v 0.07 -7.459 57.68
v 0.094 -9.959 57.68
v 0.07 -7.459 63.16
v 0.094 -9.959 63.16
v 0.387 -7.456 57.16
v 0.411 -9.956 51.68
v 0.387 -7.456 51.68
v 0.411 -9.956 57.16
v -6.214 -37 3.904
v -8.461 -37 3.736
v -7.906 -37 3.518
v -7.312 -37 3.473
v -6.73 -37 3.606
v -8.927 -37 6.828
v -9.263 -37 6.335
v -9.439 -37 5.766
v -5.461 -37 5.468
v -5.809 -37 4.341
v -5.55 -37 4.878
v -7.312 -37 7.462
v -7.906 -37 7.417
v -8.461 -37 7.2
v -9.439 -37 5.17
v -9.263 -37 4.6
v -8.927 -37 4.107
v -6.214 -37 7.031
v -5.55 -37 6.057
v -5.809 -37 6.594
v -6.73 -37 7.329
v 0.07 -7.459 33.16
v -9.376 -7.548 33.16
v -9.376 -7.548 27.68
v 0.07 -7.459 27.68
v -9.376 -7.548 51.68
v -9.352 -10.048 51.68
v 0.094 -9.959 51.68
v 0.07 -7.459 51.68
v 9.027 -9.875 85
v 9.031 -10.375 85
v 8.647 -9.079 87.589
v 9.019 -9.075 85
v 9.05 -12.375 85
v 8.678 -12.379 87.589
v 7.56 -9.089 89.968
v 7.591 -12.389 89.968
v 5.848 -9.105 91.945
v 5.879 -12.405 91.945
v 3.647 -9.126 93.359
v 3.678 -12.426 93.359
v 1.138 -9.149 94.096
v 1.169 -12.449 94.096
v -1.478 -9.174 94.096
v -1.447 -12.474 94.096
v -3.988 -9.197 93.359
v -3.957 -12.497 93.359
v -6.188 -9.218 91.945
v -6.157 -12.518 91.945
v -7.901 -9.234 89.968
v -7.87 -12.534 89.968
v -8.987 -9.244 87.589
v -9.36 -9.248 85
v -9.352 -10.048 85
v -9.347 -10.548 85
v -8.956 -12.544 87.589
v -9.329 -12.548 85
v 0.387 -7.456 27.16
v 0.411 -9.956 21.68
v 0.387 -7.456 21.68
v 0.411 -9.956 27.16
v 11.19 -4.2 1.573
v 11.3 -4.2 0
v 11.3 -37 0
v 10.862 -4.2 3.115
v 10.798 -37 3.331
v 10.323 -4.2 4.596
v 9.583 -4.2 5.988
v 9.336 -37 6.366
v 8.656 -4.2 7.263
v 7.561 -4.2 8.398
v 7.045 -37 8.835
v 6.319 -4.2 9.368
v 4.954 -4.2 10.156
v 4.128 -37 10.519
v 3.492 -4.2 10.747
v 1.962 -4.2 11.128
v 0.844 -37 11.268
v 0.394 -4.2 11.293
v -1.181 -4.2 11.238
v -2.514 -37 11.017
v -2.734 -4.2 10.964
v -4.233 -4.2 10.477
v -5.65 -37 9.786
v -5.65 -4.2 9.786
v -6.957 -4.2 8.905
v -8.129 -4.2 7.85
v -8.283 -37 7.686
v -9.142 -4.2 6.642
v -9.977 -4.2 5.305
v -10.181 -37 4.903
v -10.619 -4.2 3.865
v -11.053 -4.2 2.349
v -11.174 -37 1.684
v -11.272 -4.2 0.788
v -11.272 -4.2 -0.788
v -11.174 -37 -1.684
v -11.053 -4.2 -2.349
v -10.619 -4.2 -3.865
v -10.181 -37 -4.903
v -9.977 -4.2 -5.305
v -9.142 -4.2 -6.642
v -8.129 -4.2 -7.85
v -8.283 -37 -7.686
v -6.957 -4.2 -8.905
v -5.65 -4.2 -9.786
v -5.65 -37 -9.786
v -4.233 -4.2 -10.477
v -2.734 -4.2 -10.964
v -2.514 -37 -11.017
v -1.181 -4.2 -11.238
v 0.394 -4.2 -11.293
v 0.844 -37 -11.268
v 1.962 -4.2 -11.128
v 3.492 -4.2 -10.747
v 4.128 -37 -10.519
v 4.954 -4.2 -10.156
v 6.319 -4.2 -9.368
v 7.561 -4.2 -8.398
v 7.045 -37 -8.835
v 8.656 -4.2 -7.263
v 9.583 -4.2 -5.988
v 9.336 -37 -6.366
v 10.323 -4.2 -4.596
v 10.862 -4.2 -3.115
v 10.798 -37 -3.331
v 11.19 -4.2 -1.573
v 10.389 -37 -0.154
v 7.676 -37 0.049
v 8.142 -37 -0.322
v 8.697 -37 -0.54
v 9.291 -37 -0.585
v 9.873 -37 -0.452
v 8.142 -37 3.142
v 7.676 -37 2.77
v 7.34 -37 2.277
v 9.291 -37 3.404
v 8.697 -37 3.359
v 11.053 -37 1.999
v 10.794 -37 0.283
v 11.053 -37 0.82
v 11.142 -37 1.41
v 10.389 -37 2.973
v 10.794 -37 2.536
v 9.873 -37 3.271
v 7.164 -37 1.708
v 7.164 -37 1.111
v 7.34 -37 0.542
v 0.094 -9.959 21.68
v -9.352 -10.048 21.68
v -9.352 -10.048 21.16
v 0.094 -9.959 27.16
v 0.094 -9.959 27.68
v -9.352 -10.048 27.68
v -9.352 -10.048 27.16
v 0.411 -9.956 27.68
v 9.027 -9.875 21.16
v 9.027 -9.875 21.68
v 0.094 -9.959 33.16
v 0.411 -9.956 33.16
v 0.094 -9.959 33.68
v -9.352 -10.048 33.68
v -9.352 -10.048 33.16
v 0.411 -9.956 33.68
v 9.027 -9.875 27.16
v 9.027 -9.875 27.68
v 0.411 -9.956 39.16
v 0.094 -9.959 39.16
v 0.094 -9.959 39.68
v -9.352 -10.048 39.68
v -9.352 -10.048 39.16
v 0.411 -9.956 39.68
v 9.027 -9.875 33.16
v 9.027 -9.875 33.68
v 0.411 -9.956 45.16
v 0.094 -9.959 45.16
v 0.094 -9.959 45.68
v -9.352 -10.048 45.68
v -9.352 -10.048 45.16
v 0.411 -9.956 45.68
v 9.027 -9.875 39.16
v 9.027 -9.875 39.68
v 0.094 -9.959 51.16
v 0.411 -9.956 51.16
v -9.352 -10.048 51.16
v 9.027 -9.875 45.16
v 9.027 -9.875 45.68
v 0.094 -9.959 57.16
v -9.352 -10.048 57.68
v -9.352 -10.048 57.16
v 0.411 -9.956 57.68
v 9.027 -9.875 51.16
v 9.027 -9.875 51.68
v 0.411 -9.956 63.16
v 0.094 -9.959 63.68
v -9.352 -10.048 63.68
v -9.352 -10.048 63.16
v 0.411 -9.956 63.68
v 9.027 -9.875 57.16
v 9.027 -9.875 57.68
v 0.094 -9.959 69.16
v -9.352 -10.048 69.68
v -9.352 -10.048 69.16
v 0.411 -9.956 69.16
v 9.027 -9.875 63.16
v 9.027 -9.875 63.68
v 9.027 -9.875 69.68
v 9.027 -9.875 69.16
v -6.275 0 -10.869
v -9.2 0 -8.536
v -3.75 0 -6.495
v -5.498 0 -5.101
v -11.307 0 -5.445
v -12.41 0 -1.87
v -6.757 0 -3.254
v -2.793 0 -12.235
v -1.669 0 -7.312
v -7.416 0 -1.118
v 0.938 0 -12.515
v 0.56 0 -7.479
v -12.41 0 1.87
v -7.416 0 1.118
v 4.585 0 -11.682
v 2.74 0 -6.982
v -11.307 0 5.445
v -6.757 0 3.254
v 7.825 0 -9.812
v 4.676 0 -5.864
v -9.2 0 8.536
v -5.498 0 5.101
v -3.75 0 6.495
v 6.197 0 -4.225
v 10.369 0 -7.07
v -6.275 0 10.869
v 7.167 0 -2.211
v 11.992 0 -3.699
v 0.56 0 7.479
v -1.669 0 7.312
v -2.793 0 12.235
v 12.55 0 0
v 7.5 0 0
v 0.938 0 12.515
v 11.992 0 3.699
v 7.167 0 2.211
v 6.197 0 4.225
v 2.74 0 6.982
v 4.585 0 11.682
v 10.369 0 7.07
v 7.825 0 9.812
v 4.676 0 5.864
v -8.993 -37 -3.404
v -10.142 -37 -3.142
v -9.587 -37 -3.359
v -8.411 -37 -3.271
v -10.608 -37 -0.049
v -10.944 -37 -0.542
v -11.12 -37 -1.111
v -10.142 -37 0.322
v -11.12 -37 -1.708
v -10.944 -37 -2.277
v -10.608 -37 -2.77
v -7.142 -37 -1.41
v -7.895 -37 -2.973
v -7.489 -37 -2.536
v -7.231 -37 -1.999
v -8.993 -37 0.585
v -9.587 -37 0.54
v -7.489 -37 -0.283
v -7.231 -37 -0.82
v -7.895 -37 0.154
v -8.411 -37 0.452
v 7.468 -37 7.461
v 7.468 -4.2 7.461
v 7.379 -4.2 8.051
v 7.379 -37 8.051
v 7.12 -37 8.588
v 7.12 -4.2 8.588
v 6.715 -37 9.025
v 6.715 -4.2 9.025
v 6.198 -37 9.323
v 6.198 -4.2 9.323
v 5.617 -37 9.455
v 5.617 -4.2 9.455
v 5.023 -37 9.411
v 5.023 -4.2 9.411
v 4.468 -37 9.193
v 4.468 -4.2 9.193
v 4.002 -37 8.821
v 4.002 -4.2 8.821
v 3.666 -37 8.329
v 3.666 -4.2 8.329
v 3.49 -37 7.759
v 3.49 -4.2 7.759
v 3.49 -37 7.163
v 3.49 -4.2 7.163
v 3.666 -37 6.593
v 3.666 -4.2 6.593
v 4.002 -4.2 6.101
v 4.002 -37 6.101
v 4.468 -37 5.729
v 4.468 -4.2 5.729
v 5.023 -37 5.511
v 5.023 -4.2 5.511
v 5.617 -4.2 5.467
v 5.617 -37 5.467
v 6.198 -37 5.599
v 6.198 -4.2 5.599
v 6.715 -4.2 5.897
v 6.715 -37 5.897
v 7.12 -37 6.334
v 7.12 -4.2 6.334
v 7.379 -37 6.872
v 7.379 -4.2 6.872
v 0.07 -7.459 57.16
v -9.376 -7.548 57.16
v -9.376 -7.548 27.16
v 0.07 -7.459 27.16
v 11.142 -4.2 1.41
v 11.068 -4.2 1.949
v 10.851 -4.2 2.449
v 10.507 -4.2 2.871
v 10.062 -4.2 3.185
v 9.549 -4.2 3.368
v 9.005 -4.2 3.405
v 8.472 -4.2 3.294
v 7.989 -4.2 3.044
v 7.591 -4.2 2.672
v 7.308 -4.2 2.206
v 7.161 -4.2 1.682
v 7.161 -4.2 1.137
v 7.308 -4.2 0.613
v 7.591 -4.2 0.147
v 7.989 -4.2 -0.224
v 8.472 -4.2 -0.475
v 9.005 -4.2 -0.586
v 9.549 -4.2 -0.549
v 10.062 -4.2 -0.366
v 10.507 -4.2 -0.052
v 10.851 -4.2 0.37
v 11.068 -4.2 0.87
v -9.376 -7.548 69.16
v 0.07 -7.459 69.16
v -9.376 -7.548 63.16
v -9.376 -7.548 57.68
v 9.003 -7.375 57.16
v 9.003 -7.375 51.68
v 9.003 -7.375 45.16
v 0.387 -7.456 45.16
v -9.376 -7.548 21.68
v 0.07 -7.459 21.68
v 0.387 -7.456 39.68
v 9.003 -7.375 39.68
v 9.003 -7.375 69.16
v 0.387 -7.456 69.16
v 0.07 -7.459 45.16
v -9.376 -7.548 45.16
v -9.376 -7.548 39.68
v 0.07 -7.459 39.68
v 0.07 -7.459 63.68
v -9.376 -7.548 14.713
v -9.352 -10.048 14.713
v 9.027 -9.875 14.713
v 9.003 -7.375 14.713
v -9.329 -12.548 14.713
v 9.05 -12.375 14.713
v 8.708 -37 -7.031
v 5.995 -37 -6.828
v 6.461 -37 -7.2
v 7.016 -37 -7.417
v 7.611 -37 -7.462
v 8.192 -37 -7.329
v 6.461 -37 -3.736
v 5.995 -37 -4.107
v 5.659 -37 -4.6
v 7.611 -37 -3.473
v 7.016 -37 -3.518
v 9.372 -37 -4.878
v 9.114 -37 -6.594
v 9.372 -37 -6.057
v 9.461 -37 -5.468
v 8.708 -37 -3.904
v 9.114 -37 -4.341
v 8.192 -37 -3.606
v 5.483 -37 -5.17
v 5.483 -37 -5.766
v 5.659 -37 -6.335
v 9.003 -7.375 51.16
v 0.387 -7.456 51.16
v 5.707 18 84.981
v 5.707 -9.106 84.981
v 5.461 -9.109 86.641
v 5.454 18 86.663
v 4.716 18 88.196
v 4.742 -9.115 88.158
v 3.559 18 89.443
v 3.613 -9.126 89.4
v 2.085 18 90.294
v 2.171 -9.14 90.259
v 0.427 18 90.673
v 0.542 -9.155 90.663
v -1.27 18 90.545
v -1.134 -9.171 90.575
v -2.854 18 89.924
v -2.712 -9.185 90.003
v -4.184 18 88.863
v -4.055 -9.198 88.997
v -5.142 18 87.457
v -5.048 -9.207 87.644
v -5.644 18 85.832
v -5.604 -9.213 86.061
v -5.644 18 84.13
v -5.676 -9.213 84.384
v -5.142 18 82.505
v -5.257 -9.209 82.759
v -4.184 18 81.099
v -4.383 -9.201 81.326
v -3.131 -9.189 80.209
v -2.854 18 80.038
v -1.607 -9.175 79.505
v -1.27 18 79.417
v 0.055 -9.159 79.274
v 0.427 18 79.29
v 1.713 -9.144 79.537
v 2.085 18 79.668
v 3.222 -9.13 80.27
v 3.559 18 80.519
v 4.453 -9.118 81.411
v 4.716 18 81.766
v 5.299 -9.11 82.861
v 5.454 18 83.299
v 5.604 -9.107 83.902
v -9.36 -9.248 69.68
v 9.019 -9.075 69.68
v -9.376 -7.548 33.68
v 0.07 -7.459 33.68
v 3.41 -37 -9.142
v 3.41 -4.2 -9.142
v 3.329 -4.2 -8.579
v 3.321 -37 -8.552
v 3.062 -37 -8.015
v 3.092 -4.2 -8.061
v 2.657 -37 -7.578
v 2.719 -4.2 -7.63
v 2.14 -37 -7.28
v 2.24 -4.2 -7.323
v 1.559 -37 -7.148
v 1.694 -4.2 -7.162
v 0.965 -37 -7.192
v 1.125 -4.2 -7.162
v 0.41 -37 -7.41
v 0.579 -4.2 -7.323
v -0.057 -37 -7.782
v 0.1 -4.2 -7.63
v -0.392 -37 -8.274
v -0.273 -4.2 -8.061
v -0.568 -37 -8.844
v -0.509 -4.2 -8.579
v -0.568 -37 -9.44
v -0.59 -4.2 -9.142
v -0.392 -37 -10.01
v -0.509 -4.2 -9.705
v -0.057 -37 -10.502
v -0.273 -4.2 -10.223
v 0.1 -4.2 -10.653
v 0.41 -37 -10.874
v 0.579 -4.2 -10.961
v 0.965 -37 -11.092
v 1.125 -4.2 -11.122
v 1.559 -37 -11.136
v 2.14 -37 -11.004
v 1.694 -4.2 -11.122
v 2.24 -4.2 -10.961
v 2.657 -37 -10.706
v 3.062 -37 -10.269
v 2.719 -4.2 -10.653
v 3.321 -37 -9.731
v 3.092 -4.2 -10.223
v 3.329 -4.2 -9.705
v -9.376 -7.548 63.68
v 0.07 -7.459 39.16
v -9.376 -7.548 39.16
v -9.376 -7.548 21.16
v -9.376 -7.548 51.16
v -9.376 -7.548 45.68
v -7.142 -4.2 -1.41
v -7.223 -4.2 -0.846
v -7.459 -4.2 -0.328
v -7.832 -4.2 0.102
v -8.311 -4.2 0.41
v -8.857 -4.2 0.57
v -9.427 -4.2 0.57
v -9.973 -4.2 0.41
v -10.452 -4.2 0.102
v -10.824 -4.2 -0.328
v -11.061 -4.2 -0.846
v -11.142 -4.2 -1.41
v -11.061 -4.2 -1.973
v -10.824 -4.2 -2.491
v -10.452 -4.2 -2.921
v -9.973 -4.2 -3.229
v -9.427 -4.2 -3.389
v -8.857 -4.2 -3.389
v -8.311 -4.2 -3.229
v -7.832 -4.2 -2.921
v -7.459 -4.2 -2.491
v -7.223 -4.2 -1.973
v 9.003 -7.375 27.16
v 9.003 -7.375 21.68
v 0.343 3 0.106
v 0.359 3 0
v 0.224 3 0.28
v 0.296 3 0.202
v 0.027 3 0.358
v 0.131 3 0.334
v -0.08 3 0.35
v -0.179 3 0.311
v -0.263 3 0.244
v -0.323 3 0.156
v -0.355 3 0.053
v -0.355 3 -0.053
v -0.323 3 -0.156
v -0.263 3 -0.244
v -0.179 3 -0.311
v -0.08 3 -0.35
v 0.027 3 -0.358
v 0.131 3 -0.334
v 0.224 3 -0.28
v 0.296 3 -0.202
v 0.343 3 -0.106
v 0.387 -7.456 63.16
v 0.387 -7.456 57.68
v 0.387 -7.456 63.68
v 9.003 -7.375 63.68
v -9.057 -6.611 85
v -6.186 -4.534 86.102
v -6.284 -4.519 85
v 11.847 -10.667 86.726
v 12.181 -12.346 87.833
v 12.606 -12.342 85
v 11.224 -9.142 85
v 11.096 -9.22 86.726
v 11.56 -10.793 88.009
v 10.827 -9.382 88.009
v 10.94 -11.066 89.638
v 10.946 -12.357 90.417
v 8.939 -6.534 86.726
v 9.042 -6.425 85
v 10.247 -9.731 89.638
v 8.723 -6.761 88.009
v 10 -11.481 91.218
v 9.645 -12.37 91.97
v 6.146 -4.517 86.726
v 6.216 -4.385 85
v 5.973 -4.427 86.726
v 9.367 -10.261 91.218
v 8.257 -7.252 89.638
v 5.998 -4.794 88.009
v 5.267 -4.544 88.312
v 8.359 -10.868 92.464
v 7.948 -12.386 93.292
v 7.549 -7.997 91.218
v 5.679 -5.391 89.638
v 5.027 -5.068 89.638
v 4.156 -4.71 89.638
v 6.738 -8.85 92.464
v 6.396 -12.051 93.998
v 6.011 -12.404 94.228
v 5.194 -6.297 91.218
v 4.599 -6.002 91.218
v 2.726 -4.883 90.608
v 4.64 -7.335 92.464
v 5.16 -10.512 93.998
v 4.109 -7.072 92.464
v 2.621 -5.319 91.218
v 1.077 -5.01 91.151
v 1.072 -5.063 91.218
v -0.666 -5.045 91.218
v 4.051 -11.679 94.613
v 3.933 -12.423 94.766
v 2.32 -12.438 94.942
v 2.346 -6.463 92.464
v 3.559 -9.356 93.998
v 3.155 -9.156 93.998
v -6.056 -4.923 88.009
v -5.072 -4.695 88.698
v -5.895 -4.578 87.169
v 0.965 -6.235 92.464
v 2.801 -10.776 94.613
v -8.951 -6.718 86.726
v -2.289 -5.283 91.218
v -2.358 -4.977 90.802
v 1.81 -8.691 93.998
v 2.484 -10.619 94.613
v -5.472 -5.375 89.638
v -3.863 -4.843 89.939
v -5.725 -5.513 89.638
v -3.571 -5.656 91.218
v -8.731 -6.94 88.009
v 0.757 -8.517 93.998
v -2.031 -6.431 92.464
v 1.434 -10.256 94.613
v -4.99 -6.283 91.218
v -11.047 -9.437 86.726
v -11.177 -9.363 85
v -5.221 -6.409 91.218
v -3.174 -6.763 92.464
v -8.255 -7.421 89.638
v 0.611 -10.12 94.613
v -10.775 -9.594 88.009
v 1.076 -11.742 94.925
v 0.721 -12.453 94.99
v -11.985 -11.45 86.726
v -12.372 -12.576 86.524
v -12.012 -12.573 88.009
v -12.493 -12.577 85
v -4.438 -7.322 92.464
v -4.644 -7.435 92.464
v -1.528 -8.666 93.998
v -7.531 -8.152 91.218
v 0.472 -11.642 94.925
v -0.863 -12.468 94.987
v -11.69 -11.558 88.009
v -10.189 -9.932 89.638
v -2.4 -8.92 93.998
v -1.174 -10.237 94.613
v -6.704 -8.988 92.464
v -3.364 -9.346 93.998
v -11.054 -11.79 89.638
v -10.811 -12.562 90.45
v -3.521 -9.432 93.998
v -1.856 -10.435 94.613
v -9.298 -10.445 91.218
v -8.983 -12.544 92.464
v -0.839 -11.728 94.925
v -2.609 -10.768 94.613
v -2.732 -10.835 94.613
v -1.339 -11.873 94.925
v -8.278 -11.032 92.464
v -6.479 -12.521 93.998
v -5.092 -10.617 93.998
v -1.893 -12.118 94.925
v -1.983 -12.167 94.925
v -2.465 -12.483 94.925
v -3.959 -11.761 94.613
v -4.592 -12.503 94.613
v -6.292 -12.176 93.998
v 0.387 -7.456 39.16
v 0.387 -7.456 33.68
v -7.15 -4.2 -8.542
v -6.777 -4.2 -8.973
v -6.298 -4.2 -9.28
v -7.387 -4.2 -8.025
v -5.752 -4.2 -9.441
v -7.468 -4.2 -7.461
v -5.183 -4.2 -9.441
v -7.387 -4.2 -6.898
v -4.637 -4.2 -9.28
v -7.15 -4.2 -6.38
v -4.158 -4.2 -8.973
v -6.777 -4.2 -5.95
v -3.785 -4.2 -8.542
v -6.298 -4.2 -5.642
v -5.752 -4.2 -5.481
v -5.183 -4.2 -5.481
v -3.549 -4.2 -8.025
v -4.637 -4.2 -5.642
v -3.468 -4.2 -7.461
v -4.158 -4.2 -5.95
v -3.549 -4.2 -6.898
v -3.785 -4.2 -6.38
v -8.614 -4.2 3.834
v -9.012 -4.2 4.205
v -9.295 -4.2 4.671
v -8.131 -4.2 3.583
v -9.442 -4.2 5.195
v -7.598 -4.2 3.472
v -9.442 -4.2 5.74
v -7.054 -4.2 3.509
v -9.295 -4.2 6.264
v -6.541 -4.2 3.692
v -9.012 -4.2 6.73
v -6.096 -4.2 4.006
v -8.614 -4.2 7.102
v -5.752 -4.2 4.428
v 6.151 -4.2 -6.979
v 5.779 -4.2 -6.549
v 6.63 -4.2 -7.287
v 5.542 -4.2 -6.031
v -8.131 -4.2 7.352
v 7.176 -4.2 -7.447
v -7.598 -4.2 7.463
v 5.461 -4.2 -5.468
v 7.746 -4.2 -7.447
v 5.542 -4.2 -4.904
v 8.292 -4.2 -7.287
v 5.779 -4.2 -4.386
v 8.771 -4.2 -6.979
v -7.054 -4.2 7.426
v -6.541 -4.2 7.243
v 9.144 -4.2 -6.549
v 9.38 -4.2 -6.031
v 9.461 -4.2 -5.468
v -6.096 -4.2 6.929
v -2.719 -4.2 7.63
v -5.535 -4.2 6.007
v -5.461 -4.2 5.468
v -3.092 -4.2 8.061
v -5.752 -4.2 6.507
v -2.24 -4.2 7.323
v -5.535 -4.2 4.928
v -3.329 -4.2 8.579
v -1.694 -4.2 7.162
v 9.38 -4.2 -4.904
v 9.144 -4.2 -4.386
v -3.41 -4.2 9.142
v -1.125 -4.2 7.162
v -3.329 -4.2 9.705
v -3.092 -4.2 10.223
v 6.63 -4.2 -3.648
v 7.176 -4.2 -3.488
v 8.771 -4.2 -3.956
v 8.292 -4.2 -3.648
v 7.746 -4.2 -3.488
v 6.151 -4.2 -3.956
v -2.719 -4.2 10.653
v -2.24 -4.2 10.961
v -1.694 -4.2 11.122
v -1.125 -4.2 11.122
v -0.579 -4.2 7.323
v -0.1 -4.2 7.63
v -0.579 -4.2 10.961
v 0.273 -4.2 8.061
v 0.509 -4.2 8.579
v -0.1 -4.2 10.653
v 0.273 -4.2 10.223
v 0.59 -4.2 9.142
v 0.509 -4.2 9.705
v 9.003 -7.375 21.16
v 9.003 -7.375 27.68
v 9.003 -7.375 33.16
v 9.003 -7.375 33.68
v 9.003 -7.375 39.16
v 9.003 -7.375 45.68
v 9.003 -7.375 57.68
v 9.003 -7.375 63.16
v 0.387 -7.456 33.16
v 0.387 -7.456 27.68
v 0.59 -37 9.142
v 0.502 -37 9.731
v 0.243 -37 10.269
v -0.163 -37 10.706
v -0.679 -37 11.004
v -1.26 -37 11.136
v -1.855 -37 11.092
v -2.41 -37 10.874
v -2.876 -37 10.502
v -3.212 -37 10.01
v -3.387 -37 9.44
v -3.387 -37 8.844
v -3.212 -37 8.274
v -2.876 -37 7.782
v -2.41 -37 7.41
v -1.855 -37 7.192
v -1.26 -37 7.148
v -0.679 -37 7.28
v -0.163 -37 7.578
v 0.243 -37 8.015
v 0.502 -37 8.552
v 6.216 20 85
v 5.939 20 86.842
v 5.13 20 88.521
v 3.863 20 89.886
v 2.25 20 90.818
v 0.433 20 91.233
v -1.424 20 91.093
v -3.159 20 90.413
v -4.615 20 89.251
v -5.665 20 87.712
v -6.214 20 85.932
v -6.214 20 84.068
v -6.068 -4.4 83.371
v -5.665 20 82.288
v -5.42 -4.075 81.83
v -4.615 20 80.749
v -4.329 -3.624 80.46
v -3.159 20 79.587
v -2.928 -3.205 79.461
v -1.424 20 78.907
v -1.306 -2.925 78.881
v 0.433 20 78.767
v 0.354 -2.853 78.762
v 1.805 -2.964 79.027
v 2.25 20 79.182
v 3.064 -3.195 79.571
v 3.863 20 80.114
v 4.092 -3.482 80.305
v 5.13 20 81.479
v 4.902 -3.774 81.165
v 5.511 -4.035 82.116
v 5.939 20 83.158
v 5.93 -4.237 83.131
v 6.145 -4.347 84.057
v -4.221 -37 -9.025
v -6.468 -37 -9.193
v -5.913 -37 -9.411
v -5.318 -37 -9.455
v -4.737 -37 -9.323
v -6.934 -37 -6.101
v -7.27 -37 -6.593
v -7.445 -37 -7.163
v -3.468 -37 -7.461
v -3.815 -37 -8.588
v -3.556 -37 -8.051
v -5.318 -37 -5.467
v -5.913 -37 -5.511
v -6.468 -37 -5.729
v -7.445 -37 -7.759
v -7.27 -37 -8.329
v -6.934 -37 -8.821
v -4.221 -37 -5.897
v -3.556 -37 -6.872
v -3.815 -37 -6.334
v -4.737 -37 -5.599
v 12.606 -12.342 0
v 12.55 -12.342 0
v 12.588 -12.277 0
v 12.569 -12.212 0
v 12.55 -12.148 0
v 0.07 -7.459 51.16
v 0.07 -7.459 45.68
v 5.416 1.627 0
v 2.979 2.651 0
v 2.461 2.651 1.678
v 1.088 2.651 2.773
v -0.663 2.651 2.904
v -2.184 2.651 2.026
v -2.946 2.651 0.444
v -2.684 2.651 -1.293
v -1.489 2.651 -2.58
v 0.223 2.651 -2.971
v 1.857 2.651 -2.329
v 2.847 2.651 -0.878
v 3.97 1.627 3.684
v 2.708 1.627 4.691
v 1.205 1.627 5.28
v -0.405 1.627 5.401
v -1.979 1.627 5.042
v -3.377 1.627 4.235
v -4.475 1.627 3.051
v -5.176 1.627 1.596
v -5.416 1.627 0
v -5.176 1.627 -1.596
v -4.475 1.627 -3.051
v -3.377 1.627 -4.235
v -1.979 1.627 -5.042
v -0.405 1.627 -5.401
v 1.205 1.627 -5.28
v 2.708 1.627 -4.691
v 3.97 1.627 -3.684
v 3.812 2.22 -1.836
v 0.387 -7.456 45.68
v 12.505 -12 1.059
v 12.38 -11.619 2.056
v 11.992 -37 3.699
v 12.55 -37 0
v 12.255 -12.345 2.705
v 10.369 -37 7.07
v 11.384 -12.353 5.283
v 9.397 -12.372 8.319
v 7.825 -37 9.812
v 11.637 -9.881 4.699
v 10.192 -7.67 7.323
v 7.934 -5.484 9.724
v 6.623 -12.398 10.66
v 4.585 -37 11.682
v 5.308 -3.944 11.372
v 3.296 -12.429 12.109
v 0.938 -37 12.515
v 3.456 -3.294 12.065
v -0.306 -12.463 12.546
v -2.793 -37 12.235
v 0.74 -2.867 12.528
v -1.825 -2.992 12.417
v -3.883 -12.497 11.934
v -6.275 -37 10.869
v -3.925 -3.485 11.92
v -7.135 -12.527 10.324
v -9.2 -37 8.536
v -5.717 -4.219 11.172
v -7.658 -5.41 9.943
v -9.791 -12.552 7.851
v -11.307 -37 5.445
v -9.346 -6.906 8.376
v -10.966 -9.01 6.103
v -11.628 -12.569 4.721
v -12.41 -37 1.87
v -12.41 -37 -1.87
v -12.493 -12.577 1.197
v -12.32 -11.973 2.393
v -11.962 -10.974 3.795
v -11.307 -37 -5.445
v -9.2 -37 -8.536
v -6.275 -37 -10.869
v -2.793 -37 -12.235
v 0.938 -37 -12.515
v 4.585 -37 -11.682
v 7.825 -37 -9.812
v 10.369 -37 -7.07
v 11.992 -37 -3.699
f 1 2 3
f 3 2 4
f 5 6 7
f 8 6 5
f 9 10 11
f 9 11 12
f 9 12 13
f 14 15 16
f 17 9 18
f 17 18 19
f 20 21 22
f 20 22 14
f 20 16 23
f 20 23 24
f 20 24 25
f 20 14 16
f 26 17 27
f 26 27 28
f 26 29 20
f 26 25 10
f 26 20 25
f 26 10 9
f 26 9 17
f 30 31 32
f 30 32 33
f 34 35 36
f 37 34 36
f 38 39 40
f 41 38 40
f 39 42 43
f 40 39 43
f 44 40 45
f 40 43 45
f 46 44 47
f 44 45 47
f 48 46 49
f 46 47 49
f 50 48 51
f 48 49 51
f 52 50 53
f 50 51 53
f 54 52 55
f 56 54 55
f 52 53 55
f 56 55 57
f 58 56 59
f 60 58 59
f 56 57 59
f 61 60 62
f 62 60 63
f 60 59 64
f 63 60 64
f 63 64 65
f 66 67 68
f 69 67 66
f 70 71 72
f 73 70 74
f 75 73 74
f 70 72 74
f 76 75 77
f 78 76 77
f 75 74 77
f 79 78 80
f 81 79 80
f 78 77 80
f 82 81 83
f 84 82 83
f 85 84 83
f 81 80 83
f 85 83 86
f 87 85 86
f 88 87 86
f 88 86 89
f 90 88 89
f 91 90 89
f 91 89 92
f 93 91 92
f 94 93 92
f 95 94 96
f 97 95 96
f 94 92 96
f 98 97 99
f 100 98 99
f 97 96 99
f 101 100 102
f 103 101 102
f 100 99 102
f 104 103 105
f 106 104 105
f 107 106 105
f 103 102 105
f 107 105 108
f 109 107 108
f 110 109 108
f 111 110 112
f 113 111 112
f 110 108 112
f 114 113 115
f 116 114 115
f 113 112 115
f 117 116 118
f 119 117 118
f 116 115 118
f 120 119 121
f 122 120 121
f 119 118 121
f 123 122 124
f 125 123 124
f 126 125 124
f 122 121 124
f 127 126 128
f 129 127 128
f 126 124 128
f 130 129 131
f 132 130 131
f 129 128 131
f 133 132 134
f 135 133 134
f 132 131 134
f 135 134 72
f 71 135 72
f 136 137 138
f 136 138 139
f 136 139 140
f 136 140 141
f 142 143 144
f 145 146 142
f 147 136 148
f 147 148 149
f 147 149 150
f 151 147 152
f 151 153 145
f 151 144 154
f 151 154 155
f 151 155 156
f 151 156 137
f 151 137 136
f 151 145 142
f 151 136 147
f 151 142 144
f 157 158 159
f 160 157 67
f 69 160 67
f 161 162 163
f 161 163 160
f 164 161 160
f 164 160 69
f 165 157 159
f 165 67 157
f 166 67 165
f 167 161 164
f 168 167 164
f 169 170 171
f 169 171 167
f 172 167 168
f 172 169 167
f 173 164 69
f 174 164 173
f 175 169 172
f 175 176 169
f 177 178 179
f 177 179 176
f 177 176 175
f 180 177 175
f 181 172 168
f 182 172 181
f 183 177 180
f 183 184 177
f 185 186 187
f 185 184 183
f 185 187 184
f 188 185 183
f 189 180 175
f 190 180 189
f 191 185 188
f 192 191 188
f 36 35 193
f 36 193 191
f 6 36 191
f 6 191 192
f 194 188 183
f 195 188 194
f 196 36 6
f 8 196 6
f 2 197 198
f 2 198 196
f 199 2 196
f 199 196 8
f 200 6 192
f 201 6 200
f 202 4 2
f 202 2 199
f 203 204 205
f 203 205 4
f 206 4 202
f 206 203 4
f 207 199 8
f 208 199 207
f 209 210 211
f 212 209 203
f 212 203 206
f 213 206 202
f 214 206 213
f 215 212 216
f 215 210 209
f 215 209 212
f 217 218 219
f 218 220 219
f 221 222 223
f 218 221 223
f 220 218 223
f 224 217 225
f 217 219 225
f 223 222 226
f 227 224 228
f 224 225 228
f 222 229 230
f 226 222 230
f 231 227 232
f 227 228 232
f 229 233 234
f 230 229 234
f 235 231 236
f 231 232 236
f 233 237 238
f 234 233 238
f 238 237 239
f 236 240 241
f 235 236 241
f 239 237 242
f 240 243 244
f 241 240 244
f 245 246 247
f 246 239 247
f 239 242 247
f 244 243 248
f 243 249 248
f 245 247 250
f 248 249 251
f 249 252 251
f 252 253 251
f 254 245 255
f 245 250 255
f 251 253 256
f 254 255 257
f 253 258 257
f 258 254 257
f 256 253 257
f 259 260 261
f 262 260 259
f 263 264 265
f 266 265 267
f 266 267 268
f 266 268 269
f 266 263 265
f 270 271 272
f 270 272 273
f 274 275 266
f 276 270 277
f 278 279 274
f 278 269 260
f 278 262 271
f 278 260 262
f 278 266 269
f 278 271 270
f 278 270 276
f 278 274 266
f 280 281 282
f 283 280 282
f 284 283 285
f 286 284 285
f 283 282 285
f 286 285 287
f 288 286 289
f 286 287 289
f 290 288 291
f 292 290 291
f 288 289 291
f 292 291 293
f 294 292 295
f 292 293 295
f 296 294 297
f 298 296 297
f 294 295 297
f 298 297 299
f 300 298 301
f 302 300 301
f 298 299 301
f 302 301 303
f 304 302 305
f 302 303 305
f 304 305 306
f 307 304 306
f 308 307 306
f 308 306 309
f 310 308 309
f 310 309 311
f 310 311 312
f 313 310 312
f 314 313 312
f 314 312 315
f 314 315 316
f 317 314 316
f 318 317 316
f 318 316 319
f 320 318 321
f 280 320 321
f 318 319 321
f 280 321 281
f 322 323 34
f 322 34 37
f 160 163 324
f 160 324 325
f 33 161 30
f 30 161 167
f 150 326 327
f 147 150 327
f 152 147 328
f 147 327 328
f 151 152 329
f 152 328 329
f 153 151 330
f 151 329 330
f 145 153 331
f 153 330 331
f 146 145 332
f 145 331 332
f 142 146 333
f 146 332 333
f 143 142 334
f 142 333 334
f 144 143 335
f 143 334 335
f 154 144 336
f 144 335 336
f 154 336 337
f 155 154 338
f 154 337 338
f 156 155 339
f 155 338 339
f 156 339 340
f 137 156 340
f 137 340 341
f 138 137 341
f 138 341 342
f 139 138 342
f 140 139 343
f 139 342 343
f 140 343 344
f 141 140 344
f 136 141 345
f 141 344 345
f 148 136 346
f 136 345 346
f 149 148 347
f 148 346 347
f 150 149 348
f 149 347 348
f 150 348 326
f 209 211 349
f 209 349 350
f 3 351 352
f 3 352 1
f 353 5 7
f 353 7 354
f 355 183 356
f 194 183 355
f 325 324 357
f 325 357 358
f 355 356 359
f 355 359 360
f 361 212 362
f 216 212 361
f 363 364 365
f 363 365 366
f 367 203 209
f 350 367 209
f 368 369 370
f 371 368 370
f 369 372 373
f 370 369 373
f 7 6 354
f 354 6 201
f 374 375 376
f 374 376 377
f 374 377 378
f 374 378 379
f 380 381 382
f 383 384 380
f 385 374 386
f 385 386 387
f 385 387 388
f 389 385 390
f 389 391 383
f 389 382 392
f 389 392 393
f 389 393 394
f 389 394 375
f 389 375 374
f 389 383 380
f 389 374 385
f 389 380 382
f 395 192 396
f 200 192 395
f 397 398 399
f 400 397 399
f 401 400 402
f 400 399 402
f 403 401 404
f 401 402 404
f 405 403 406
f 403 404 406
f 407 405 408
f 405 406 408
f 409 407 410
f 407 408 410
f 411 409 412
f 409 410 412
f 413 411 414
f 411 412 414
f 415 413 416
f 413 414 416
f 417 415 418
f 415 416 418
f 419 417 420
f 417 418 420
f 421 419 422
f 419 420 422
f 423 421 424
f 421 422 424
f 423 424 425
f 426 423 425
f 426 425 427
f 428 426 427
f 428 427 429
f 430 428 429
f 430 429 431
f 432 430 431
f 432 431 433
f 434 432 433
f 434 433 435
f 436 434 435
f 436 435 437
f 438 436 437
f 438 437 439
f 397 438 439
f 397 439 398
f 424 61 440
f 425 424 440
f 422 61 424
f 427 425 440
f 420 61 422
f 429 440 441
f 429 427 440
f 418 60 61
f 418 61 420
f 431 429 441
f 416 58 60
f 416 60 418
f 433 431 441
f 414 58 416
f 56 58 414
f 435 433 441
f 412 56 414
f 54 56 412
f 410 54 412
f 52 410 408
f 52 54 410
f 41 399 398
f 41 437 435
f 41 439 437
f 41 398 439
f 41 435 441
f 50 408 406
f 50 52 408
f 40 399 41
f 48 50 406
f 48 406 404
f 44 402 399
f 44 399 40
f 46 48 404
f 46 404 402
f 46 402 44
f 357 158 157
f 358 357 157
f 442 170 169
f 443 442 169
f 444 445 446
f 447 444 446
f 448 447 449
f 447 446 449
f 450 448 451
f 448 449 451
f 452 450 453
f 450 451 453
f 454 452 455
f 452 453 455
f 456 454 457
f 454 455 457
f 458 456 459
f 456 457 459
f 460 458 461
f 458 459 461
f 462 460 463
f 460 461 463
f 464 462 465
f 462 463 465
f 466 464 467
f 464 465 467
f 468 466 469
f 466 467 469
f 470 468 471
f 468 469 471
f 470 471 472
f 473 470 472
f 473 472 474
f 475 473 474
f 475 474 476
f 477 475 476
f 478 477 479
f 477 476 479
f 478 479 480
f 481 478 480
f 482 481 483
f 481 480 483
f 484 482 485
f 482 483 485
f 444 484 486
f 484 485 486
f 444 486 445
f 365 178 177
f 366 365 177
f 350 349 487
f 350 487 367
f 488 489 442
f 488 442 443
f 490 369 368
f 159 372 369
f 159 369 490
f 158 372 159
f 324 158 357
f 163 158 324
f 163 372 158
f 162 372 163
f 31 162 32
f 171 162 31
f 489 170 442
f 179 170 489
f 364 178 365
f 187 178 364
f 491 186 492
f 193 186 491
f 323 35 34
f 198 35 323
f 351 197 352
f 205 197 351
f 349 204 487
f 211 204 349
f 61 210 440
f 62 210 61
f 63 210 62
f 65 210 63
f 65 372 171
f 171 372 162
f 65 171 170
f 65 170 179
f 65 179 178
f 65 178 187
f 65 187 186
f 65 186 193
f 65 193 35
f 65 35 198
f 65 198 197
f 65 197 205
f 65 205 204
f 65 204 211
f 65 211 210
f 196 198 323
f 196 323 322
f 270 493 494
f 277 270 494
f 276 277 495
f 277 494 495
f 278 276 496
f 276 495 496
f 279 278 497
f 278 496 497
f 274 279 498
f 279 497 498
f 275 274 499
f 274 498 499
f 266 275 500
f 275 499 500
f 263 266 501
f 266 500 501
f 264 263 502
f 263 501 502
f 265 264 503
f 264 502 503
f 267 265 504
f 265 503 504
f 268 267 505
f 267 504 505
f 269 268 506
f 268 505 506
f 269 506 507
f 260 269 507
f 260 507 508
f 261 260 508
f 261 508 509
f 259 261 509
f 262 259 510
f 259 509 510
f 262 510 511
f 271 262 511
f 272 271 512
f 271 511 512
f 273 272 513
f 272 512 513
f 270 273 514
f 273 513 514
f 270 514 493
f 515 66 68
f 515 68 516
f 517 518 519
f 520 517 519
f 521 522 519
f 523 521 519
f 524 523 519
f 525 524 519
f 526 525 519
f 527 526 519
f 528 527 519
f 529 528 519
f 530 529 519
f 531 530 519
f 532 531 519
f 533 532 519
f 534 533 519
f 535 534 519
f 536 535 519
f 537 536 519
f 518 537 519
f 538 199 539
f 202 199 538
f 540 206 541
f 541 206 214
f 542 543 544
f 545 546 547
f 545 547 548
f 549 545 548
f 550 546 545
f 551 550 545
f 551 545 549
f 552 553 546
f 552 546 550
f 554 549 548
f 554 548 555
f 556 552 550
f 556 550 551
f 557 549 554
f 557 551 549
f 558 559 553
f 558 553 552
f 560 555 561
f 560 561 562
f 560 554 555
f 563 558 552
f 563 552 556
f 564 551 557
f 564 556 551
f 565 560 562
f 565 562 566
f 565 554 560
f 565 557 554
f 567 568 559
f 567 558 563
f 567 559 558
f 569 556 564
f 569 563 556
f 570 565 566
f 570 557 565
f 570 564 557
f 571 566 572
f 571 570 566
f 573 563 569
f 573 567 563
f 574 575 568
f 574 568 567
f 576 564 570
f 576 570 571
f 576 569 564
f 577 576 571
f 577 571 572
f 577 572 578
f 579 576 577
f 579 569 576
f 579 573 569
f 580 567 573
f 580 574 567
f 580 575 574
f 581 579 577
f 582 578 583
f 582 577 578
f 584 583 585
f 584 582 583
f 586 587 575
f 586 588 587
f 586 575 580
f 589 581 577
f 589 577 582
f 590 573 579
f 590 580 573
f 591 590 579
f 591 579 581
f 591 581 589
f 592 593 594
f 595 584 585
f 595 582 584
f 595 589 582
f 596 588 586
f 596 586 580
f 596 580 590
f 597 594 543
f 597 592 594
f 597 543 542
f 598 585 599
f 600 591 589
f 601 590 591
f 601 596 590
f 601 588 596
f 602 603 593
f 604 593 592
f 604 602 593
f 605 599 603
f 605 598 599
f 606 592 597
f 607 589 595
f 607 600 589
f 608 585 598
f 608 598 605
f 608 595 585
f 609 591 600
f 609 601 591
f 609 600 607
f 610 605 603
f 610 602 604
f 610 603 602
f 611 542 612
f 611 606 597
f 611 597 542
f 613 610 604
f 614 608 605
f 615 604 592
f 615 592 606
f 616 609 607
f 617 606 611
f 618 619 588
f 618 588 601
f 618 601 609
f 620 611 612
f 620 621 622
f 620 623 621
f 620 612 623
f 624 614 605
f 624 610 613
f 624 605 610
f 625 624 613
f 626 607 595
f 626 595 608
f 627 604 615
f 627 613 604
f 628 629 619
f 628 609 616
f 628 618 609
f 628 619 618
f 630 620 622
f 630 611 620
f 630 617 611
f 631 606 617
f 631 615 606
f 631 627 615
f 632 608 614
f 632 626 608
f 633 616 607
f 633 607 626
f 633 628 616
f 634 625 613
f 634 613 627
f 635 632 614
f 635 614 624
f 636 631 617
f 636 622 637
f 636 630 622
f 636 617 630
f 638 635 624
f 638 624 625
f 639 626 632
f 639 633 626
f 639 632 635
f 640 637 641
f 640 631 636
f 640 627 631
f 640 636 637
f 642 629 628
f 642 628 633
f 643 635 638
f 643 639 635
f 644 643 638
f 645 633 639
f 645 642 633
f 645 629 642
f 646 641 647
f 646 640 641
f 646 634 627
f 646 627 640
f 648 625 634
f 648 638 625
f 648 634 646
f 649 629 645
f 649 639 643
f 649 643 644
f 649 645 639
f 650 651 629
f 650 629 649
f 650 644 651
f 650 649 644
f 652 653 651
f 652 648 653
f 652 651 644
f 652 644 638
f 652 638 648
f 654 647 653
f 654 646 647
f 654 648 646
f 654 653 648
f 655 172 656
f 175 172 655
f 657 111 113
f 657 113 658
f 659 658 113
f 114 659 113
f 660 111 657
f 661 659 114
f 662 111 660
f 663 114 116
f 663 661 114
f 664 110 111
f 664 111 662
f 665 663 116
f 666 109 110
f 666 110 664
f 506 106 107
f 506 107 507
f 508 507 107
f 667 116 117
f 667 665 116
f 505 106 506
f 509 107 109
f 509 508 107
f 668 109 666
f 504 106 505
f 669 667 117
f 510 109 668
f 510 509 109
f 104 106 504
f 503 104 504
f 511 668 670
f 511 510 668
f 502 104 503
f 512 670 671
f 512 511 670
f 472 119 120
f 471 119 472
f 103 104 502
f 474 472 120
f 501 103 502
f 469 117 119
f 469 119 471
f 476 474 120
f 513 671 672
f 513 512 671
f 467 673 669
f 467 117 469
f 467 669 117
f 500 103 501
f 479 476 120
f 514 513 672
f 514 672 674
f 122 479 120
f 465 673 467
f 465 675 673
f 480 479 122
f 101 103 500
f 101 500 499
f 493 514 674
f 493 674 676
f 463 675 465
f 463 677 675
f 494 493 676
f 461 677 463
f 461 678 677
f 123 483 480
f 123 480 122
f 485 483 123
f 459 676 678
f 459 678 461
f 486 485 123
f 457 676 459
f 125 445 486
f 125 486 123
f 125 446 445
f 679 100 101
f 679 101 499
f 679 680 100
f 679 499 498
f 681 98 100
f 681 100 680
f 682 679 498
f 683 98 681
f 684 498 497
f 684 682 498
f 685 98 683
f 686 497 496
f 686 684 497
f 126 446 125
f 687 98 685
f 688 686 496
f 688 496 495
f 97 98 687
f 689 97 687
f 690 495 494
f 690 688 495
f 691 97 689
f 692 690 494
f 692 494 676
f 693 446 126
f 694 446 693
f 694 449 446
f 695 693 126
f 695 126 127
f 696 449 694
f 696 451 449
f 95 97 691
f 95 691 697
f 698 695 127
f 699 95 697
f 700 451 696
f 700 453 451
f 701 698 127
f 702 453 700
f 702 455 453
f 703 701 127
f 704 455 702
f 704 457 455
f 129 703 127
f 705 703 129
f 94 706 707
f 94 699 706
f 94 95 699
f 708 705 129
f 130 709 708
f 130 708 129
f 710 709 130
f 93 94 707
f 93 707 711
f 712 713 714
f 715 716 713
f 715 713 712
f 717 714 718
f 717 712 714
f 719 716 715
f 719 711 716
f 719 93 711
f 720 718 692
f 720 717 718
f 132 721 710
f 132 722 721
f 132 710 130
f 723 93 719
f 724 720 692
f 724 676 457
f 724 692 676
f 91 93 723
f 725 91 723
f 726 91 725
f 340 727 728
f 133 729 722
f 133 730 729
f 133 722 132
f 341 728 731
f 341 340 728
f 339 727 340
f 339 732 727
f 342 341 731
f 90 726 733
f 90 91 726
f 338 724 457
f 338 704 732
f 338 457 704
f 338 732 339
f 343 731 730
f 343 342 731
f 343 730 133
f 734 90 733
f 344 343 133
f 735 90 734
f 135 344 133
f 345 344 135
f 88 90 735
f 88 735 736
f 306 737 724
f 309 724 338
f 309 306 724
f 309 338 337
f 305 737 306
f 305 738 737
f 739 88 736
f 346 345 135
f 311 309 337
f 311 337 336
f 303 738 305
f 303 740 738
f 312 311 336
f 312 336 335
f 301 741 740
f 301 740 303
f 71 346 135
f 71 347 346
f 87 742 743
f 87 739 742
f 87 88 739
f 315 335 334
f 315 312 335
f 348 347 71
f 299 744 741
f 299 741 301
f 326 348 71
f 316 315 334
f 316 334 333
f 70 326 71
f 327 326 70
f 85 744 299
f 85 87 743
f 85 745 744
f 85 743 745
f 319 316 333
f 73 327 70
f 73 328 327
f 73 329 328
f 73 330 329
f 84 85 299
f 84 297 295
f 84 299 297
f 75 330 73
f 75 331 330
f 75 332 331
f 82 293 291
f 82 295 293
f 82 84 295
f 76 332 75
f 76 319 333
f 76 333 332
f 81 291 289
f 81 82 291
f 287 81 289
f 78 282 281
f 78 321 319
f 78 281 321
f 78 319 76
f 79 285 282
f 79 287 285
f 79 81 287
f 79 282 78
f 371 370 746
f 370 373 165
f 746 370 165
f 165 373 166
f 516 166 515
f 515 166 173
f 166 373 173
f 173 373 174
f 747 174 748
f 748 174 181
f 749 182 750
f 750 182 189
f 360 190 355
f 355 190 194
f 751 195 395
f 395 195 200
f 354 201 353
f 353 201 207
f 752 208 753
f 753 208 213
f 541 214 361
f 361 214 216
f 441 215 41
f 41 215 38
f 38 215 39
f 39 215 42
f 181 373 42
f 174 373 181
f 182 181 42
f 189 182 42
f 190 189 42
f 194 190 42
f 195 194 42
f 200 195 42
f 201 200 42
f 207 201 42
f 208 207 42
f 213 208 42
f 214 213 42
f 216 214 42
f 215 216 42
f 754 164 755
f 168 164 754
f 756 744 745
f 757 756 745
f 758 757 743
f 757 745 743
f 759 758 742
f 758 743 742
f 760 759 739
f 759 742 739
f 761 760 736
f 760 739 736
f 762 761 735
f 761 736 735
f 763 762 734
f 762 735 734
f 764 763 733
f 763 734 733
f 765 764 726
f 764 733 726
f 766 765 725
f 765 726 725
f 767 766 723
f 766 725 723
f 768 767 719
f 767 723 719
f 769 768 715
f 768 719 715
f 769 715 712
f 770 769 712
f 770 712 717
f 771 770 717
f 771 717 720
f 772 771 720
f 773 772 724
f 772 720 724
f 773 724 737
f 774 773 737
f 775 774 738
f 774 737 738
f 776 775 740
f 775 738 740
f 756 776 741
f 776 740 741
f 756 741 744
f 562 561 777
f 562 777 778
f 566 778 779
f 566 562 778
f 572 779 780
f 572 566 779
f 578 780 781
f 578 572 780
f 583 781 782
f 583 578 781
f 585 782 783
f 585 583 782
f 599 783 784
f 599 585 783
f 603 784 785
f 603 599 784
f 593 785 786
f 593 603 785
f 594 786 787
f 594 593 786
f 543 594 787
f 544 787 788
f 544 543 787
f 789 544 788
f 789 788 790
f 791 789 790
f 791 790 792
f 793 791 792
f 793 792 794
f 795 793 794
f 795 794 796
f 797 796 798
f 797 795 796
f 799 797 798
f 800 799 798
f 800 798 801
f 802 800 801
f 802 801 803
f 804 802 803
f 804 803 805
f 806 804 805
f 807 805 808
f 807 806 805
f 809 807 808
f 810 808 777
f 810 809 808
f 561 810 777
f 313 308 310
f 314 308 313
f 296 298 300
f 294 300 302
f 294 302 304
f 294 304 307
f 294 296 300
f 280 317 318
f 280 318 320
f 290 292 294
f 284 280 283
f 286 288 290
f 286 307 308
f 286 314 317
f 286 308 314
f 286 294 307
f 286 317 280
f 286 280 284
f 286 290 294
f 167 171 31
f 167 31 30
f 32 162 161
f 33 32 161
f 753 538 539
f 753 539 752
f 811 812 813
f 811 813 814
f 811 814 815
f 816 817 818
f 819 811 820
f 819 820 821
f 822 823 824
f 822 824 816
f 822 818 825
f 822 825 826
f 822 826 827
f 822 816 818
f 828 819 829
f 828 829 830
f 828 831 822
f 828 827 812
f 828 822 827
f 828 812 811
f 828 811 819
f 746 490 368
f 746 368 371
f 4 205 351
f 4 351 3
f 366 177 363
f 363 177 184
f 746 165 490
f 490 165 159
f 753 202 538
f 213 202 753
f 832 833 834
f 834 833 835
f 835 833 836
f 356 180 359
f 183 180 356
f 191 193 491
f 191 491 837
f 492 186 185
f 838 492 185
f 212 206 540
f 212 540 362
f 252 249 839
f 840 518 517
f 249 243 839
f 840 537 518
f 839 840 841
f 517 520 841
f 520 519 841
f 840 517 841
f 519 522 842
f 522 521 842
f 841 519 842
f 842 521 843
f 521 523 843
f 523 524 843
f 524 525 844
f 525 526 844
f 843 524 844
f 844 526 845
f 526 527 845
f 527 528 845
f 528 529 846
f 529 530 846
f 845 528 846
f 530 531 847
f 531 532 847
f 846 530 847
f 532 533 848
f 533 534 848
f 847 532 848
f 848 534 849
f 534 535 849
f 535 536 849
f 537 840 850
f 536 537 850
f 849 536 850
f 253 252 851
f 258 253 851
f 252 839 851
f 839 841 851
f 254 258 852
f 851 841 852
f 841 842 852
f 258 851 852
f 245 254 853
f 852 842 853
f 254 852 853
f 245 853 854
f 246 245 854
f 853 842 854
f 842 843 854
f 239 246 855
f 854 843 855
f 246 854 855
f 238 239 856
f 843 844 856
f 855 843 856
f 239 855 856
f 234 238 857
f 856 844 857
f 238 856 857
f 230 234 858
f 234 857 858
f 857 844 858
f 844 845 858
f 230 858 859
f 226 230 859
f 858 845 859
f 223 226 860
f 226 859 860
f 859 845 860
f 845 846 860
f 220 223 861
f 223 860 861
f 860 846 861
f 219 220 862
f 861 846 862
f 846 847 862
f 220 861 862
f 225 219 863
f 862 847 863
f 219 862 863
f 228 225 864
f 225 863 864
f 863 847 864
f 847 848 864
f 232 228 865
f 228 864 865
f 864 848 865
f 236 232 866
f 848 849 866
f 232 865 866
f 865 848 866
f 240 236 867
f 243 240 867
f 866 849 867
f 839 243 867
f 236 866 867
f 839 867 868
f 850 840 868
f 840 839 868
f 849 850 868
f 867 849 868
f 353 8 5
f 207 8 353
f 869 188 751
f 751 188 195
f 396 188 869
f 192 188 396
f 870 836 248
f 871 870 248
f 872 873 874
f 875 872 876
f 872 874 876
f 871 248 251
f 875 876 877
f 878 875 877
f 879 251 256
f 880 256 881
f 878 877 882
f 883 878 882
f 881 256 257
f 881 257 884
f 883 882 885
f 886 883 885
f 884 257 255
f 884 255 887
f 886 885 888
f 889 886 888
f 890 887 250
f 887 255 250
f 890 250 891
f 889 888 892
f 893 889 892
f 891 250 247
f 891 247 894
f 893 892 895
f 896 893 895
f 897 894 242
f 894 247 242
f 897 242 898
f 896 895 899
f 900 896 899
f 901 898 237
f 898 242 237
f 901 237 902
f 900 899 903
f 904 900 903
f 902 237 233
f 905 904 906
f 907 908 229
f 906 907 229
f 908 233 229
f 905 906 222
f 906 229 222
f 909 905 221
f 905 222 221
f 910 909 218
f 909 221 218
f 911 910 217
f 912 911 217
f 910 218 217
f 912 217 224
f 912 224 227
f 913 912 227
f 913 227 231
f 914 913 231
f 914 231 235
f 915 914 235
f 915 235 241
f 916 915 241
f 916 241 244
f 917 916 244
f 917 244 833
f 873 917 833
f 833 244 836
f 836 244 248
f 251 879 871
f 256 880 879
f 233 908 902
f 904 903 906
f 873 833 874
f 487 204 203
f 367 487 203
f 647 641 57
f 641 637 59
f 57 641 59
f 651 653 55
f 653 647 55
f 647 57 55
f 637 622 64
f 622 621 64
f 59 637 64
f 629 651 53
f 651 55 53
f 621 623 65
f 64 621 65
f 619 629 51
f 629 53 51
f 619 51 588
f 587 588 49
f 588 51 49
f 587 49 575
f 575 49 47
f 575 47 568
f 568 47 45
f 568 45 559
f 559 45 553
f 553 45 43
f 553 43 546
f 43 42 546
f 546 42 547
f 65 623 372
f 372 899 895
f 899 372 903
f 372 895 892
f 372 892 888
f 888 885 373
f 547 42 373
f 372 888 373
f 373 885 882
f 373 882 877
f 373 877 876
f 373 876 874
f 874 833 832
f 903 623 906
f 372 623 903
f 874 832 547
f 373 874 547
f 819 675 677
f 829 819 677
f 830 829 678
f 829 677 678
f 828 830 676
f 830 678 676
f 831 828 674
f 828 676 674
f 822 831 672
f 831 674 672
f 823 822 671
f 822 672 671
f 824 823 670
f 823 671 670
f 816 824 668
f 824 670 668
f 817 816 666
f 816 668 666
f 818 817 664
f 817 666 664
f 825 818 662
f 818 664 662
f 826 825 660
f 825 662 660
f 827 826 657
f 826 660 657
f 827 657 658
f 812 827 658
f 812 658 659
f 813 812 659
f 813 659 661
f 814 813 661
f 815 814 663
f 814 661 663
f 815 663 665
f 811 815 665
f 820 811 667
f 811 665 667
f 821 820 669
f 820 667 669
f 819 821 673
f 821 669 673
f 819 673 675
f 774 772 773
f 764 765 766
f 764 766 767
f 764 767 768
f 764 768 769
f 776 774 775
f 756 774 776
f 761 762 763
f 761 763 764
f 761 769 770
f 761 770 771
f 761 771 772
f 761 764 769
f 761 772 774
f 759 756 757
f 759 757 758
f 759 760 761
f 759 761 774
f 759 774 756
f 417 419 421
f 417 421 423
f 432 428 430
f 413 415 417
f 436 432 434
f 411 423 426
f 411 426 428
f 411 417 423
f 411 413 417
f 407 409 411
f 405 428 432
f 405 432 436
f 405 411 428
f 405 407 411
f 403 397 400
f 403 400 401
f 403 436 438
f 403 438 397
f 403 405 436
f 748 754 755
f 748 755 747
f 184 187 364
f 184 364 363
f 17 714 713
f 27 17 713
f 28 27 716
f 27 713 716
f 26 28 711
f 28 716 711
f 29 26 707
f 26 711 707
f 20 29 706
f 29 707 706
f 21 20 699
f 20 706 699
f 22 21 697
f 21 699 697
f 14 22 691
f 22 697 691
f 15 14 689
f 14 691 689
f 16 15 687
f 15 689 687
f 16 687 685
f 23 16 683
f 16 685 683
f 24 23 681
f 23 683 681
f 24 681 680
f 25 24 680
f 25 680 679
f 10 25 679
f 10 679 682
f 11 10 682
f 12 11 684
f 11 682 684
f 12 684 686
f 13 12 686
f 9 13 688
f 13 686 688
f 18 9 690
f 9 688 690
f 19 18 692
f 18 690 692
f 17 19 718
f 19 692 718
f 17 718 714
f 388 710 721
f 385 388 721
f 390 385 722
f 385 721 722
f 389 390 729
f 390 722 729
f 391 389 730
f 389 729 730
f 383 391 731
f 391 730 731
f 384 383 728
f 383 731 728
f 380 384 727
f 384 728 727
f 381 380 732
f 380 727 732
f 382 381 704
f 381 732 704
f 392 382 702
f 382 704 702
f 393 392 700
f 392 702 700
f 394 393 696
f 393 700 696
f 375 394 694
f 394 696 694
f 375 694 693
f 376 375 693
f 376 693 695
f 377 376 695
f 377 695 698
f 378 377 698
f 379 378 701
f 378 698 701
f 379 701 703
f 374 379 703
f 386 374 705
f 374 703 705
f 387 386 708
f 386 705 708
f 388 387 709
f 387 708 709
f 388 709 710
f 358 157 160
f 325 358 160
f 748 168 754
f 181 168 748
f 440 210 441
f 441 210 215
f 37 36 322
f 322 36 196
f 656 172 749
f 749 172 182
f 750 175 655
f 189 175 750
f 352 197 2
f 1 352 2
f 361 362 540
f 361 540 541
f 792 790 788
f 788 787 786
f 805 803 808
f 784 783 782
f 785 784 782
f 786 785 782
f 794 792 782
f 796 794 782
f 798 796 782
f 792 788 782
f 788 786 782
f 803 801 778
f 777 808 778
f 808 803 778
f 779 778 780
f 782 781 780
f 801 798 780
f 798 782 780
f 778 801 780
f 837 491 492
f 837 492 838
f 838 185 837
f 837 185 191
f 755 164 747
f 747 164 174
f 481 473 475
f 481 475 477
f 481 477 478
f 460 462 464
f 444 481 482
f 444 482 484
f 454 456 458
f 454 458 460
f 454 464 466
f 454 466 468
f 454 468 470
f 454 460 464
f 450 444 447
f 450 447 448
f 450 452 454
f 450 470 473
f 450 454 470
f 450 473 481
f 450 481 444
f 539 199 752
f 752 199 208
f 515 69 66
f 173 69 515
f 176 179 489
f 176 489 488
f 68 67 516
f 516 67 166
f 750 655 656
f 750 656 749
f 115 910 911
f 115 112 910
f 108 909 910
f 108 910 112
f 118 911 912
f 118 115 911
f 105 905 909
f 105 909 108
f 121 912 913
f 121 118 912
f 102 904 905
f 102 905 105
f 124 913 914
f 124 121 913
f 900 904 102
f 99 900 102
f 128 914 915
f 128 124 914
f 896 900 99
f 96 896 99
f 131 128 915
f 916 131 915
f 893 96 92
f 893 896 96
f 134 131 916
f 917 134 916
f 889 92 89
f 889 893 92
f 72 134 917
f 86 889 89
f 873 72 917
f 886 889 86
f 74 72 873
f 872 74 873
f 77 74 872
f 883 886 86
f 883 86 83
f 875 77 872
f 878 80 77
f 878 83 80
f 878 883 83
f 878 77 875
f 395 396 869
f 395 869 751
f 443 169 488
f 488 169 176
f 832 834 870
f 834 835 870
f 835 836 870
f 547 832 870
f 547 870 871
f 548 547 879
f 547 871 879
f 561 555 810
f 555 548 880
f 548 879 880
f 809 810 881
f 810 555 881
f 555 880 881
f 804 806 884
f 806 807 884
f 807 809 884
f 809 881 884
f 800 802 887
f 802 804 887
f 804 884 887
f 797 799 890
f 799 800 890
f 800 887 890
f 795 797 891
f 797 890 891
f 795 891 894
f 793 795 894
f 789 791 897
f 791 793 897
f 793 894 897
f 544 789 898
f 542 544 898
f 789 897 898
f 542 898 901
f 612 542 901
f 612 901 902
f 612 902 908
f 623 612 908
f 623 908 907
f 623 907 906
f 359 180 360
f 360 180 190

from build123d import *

# Parameters (mm, degrees)
F0_R        = 12.55
F1_DEPTH    = 37
F2_R        = 7.5
F3_DEPTH    = 3
F6_DEPTH    = 95
F7_T2_ANGLE = 359.64
F9_R        = 6.25
F10_DEPTH   = 30
F11_W       = 18.3796742931
F11_H       = 70.2870060131
F12_DEPTH   = 2
F13_DEPTH   = 2.5
F14_W       = 9.4460686669
F14_H       = 6.4466400072
F14_H_2     = 5.4794391096
F14_W_2     = 8.6165779212
F14_W_3     = 0.317027705
F15_DEPTH   = 2.5
F16_DEPTH   = 0.8
F17_R       = 5.7074191609
F18_DEPTH   = 28
F19_R       = 11.3
F20_DEPTH   = 32.8
F21_R       = 2
F22_DEPTH   = 32.8


# Not quite as in the source:
# - a fillet or chamfer that OpenCascade refuses, or shapes differently, is made with other operations: its cross-section is extruded or revolved along the edge and cut away or added


with BuildPart() as f1:
    # F0 (on Front) → F1 (new body)
    with BuildSketch(Plane.XZ):
        Circle(F0_R)
    extrude(amount=F1_DEPTH)

    # F2 (on Front) → F3 (join)
    with BuildSketch(Plane.XZ):
        Circle(F2_R)
    extrude(amount=-F3_DEPTH)

    # F4: fillet of radius 10 on 1 edges, made by hand

    # F4_s1 → F4_t2 (revolve, cut)
    with BuildSketch(Plane.XY):
        with BuildLine():
            ThreePointArc((7.5, 0), (4.2315549177, 2.2195444573), (0.3585715715, 3))
            Line((0.3585715715, 3), (7.5, 3))
            Line((7.5, 3), (7.5, 0))
        make_face()
    revolve(axis=Axis((0, 3, 0), (0, -1, 0)), mode=Mode.SUBTRACT)

    # F5 (on Top) → F6 (join)
    with BuildSketch(Plane.XY):
        with BuildLine():
            Line((-12.4928209826, -12.5774559094), (12.6060726016, -12.3417848491))
            ThreePointArc((12.6060726016, -12.3417848491), (-0.0335977446, -2.8508403226), (-12.4928209826, -12.5774559094))
        make_face()
    extrude(amount=F6_DEPTH)

    # F7: fillet of radius 10 on 1 edges, made by hand

    # F7_s1 → F7_t2 (revolve, cut)
    with BuildSketch(Plane(origin=(-0.1101500857, -0.0013803647, 0), x_dir=(0, 0, 1), z_dir=(-0.9999214878, -0.0125306879, 0))):
        with BuildLine():
            ThreePointArc((85, -28.8501313418), (92.0710678119, -25.9211991536), (95, -18.8501313418))
            Line((95, -18.8501313418), (95, -28.8501313418))
            Line((95, -28.8501313418), (85, -28.8501313418))
        make_face()
    revolve(axis=Axis((0.0884629639, -15.8502672786, 95), (0, 0, 1)), revolution_arc=F7_T2_ANGLE, mode=Mode.SUBTRACT)

    # F9 (on offset) → F10 (join)
    with BuildSketch(Plane.XZ.offset(10)):
        with Locations((-0.0335977446, 85)):
            Circle(F9_R)
    extrude(amount=-F10_DEPTH)

    # F11 (on face) → F12 (cut)
    with BuildSketch(Plane(origin=(0.1169867653, -12.4590536081, 0), x_dir=(0.9999559197, 0.0093892853, 0), z_dir=(0.0093892853, -0.9999559197, 0))):
        with Locations((-0.2562315203, 49.8564969935)):
            Rectangle(F11_W, F11_H)
    extrude(amount=-F12_DEPTH, mode=Mode.SUBTRACT)

    # F11 (on face) → F13 (cut)
    with BuildSketch(Plane(origin=(0.1169867653, -12.4590536081, 0), x_dir=(0.9999559197, 0.0093892853, 0), z_dir=(0.0093892853, -0.9999559197, 0))):
        with BuildLine():
            ThreePointArc((8.9336056262, 85), (-0.2562315203, 94.1898371466), (-9.4460686669, 85))
            Line((-9.4460686669, 85), (8.9336056262, 85))
        make_face()
        with Locations((-0.2562315203, 49.8564969935)):
            Rectangle(F11_W, F11_H)
    extrude(amount=-F13_DEPTH, mode=Mode.SUBTRACT)

    # F14 (on face) → F15 (cut)
    with BuildSketch(Plane(origin=(0.0935135522, -9.9591638088, 0), x_dir=(0.9999559197, 0.0093892853, 0), z_dir=(0.0093892853, -0.9999559197, 0))):
        with Locations((-4.7230343334, 17.9363139905)):
            Rectangle(F14_W, F14_H)
        with Locations((-4.7230343334, 24.4199144393)):
            Rectangle(F14_W, F14_H_2)
        with Locations((-4.7230343334, 30.4199144393)):
            Rectangle(F14_W, F14_H_2)
        with Locations((-4.7230343334, 36.4199144393)):
            Rectangle(F14_W, F14_H_2)
        with Locations((-4.7230343334, 42.4199144393)):
            Rectangle(F14_W, F14_H_2)
        with Locations((-4.7230343334, 48.4199144393)):
            Rectangle(F14_W, F14_H_2)
        with Locations((-4.7230343334, 54.4199144393)):
            Rectangle(F14_W, F14_H_2)
        with Locations((-4.7230343334, 60.4199144393)):
            Rectangle(F14_W, F14_H_2)
        with Locations((-4.7230343334, 66.4199144393)):
            Rectangle(F14_W, F14_H_2)
        with Locations((4.6253166656, 66.4199144393)):
            Rectangle(F14_W_2, F14_H_2)
        with Locations((4.6253166656, 60.4199144393)):
            Rectangle(F14_W_2, F14_H_2)
        with Locations((4.6253166656, 54.4199144393)):
            Rectangle(F14_W_2, F14_H_2)
        with Locations((4.6253166656, 48.4199144393)):
            Rectangle(F14_W_2, F14_H_2)
        with Locations((4.6253166656, 42.4199144393)):
            Rectangle(F14_W_2, F14_H_2)
        with Locations((4.6253166656, 36.4199144393)):
            Rectangle(F14_W_2, F14_H_2)
        with Locations((4.6253166656, 30.4199144393)):
            Rectangle(F14_W_2, F14_H_2)
        with Locations((4.6253166656, 24.4199144393)):
            Rectangle(F14_W_2, F14_H_2)
        with Locations((0.1585138525, 17.9363139905)):
            Rectangle(F14_W_3, F14_H)
        with Locations((4.6253166656, 17.9363139905)):
            Rectangle(F14_W_2, F14_H)
    extrude(amount=-F15_DEPTH, mode=Mode.SUBTRACT)

    # F14 (on face) → F16 (cut)
    with BuildSketch(Plane(origin=(0.0935135522, -9.9591638088, 0), x_dir=(0.9999559197, 0.0093892853, 0), z_dir=(0.0093892853, -0.9999559197, 0))):
        with BuildLine():
            Line((-9.4460686669, 85), (-9.4460686669, 69.6801948845))
            Line((-9.4460686669, 69.6801948845), (0, 69.6801948845))
            Line((0, 69.6801948845), (0.317027705, 69.6801948845))
            Line((0.317027705, 69.6801948845), (8.9336056262, 69.6801948845))
            Line((8.9336056262, 69.6801948845), (8.9336056262, 85))
            ThreePointArc((8.9336056262, 85), (-0.2562315203, 94.1898371466), (-9.4460686669, 85))
        make_face()
    extrude(amount=-F16_DEPTH, mode=Mode.SUBTRACT)

    # F17 (on face) → F18 (cut)
    with BuildSketch(Plane.XZ.offset(10)):
        with Locations((0, 84.9810764194)):
            Circle(F17_R)
    extrude(amount=-F18_DEPTH, mode=Mode.SUBTRACT)

    # F19 (on face) → F20 (cut)
    with BuildSketch(Plane.XZ.offset(37)):
        Circle(F19_R)
    extrude(amount=-F20_DEPTH, mode=Mode.SUBTRACT)

    # F21 (on face) → F22 (join)
    with BuildSketch(Plane.XZ.offset(4.2)):
        with Locations((-7.4610639253, 5.4676343242)):
            Circle(F21_R)
        with Locations((-9.1419702041, -1.4095675888)):
            Circle(F21_R)
        with Locations((-5.4676343242, -7.4610639253)):
            Circle(F21_R)
        with Locations((1.4095675888, -9.1419702041)):
            Circle(F21_R)
        with Locations((7.4610639253, -5.4676343242)):
            Circle(F21_R)
        with Locations((9.1419702041, 1.4095675888)):
            Circle(F21_R)
        with Locations((5.4676343242, 7.4610639253)):
            Circle(F21_R)
        with Locations((-1.4095675888, 9.1419702041)):
            Circle(F21_R)
    extrude(amount=F22_DEPTH)


solid = f1.part
